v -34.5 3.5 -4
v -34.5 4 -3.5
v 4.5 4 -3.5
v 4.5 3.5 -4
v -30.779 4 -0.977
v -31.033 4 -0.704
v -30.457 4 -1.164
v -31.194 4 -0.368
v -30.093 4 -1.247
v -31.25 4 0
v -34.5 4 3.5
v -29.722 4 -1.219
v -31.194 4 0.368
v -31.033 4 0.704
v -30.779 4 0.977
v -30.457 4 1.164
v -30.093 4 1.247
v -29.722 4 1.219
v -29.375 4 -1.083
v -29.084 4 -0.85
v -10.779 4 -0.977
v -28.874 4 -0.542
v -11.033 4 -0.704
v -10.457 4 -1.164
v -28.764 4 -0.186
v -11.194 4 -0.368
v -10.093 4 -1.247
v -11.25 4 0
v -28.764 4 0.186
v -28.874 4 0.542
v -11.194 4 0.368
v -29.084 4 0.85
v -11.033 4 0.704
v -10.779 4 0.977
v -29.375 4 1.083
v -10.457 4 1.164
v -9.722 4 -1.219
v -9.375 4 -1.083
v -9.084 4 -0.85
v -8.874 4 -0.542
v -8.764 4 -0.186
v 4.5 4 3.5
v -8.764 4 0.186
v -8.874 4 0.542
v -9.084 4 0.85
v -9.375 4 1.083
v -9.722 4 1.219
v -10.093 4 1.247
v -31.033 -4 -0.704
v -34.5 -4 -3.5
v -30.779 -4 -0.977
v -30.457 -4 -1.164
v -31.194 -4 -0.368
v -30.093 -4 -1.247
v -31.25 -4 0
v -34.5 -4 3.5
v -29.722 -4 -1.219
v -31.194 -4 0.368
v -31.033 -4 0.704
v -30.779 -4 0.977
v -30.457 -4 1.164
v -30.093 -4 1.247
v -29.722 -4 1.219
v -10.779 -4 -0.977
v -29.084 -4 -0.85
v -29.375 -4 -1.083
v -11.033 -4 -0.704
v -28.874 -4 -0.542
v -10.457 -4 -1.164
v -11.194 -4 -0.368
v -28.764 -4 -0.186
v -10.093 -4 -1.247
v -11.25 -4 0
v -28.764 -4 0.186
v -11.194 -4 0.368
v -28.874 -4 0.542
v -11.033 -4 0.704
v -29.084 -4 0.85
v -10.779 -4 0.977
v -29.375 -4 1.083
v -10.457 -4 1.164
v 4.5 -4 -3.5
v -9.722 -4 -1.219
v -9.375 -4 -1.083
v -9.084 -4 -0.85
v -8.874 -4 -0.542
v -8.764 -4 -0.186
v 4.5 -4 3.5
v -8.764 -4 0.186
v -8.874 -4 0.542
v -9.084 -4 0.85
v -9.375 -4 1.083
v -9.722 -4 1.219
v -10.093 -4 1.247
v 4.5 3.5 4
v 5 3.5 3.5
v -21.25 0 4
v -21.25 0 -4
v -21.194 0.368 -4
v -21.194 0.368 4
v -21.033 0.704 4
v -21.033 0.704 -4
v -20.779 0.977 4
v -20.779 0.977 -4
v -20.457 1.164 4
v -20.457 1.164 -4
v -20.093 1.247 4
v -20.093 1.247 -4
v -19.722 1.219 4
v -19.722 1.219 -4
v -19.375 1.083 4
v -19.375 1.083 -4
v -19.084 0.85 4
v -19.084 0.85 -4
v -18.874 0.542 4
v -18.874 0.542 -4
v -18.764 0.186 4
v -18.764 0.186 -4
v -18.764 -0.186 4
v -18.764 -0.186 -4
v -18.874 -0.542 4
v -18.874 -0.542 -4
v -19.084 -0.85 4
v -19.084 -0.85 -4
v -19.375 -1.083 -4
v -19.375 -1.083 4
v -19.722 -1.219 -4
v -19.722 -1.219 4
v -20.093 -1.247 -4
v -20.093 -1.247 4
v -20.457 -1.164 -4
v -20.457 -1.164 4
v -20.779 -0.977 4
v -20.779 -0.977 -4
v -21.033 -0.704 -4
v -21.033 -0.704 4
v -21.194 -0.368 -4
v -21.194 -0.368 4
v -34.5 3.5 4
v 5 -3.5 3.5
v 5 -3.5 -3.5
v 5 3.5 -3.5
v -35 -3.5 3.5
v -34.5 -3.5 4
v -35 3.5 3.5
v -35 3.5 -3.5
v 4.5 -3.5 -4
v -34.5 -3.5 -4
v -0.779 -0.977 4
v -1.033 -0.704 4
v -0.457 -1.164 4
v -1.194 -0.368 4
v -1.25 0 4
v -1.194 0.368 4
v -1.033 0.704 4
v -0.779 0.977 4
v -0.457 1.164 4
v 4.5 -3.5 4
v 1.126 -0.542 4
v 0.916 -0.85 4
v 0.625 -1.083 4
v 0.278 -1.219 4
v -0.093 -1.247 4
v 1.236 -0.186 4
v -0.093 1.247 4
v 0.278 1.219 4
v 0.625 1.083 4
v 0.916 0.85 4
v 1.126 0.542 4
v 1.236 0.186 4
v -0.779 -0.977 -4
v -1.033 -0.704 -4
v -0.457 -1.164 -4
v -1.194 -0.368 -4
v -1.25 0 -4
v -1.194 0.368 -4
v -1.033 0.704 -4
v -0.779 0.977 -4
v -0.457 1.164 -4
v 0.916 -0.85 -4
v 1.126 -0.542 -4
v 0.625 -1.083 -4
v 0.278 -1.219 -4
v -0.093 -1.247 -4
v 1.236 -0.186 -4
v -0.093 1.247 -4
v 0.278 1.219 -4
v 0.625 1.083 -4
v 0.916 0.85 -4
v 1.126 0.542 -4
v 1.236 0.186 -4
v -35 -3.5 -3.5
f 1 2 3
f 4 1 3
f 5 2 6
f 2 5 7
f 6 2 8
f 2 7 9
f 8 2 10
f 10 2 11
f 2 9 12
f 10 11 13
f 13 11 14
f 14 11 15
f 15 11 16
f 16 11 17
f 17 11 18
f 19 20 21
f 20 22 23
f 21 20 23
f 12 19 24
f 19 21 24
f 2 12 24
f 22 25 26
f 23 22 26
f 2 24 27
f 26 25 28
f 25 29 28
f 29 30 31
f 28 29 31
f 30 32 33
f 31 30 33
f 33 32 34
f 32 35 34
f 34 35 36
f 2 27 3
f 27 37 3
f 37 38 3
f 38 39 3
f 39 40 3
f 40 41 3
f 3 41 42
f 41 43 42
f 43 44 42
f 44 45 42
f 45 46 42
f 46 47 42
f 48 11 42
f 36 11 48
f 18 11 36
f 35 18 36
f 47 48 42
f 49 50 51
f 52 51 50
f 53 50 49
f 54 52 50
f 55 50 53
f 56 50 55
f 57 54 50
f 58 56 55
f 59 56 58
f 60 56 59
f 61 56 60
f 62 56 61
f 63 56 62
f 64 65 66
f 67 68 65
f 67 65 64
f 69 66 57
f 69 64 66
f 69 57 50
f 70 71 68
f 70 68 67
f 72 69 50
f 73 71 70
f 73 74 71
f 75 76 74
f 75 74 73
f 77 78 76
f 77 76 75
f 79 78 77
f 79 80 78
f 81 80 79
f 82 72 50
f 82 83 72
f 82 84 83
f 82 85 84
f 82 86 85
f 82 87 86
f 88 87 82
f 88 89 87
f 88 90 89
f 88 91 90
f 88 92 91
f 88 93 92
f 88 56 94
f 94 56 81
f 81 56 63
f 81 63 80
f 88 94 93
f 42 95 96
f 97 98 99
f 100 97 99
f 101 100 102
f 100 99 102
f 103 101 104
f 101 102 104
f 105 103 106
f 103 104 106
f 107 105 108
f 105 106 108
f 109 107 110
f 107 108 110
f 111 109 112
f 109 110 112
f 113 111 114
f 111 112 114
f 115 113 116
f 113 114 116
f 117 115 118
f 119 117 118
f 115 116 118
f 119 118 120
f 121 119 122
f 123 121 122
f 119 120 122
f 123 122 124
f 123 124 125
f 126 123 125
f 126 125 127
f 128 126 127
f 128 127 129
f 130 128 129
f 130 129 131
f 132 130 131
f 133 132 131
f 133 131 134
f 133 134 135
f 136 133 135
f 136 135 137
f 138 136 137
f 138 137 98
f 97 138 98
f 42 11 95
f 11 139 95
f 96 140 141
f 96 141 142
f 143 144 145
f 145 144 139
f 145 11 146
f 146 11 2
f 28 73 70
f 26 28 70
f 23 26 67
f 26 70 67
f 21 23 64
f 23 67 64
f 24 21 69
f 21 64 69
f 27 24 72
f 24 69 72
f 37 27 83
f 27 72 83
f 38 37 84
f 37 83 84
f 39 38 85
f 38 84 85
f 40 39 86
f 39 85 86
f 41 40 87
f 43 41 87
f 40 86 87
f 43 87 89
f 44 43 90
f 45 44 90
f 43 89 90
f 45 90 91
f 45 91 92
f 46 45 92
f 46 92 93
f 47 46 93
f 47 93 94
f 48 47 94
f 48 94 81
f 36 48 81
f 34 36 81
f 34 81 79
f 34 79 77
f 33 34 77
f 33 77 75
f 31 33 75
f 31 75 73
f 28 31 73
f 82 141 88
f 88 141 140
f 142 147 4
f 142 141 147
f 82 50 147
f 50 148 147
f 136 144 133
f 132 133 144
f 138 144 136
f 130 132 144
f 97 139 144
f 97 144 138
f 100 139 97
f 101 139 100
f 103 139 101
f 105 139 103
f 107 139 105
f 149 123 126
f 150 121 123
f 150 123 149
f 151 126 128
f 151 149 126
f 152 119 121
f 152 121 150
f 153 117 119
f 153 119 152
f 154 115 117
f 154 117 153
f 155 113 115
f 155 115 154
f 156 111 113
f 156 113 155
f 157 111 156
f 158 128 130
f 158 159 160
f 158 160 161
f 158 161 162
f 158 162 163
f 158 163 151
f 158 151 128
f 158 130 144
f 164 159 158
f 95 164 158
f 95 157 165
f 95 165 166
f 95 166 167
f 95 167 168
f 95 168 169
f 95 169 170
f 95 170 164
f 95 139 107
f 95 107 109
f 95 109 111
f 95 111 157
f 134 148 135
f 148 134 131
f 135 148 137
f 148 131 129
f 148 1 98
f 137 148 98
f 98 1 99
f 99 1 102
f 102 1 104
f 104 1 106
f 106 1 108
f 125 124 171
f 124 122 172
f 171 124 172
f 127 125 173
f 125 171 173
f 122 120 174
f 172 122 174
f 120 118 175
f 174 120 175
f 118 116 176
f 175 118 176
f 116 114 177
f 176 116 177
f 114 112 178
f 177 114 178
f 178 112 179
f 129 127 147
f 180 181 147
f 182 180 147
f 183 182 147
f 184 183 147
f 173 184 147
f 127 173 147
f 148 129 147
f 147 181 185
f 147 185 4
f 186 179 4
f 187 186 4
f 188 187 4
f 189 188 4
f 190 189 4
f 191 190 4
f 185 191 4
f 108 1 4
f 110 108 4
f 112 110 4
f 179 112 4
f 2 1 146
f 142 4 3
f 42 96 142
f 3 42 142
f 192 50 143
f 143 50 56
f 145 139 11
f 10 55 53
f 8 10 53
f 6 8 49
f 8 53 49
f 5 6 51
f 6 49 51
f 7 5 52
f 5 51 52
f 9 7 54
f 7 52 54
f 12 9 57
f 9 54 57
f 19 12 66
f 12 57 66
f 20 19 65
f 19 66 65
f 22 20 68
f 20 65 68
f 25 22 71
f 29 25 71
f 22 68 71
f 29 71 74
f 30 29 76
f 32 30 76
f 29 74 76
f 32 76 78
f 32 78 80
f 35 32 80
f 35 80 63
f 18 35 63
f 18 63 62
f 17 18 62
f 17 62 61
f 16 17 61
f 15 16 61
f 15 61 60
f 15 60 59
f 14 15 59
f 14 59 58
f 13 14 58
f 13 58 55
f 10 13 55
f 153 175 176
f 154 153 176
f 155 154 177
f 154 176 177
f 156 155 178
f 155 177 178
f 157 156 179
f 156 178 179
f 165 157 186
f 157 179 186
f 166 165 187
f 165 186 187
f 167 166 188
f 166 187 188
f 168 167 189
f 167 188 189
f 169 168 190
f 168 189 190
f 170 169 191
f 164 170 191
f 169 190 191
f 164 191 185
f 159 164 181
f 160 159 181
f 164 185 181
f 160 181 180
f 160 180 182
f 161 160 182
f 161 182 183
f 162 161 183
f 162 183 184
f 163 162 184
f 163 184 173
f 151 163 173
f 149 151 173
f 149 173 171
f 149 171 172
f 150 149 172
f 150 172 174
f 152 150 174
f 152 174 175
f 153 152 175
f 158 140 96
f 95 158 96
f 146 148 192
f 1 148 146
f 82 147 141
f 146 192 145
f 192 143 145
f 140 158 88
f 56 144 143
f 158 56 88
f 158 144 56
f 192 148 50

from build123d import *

# Parameters (mm, degrees)
SKETCH_2_W         = 40
SKETCH_2_H         = 8
SKETCH_2_R         = 0.5
EXTRUDE_1_DEPTH    = 4
HOLE_WIZARD_M3_1_D = 2.5
HOLE_WIZARD_M3_2_D = 2.5
CHAMFER_1_SIZE     = 0.5


with BuildPart() as part:
    # 草图2 → 凸台-拉伸1 (new body, symmetric)
    with BuildSketch(Plane.XY):
        with Locations((-15, 0)):
            Rectangle(SKETCH_2_W, SKETCH_2_H)
        with Locations((-20, 0)):
            Circle(SKETCH_2_R, mode=Mode.SUBTRACT)
        Circle(SKETCH_2_R, mode=Mode.SUBTRACT)
    extrude(amount=EXTRUDE_1_DEPTH, both=True)

    # M3 螺纹孔1 (through all)
    with Locations(Plane.XY.offset(4)):
        with Locations((0, 0), (-20, 0)):
            Hole(HOLE_WIZARD_M3_1_D / 2)

    # M3 螺纹孔2 (through all)
    with Locations(Plane(origin=(0, 4, 0), x_dir=(1, 0, 0), z_dir=(0, 1, 0))):
        with Locations((-10, 0), (-30, 0)):
            Hole(HOLE_WIZARD_M3_2_D / 2)

    # 倒角1
    chamfer_1_edges = [part.edges().sort_by_distance(p)[0] for p in [
        (-15, -4, 4),
        (5, 0, 4),
        (-15, 4, 4),
        (5, 0, -4),
        (-15, -4, -4),
        (-35, 0, -4),
        (-15, 4, -4),
        (-35, 0, 4),
        (5, 4, 0),
        (5, -4, 0),
        (-35, -4, 0),
        (-35, 4, 0),
    ]]
    chamfer(chamfer_1_edges, length=CHAMFER_1_SIZE)


solid = part.part
